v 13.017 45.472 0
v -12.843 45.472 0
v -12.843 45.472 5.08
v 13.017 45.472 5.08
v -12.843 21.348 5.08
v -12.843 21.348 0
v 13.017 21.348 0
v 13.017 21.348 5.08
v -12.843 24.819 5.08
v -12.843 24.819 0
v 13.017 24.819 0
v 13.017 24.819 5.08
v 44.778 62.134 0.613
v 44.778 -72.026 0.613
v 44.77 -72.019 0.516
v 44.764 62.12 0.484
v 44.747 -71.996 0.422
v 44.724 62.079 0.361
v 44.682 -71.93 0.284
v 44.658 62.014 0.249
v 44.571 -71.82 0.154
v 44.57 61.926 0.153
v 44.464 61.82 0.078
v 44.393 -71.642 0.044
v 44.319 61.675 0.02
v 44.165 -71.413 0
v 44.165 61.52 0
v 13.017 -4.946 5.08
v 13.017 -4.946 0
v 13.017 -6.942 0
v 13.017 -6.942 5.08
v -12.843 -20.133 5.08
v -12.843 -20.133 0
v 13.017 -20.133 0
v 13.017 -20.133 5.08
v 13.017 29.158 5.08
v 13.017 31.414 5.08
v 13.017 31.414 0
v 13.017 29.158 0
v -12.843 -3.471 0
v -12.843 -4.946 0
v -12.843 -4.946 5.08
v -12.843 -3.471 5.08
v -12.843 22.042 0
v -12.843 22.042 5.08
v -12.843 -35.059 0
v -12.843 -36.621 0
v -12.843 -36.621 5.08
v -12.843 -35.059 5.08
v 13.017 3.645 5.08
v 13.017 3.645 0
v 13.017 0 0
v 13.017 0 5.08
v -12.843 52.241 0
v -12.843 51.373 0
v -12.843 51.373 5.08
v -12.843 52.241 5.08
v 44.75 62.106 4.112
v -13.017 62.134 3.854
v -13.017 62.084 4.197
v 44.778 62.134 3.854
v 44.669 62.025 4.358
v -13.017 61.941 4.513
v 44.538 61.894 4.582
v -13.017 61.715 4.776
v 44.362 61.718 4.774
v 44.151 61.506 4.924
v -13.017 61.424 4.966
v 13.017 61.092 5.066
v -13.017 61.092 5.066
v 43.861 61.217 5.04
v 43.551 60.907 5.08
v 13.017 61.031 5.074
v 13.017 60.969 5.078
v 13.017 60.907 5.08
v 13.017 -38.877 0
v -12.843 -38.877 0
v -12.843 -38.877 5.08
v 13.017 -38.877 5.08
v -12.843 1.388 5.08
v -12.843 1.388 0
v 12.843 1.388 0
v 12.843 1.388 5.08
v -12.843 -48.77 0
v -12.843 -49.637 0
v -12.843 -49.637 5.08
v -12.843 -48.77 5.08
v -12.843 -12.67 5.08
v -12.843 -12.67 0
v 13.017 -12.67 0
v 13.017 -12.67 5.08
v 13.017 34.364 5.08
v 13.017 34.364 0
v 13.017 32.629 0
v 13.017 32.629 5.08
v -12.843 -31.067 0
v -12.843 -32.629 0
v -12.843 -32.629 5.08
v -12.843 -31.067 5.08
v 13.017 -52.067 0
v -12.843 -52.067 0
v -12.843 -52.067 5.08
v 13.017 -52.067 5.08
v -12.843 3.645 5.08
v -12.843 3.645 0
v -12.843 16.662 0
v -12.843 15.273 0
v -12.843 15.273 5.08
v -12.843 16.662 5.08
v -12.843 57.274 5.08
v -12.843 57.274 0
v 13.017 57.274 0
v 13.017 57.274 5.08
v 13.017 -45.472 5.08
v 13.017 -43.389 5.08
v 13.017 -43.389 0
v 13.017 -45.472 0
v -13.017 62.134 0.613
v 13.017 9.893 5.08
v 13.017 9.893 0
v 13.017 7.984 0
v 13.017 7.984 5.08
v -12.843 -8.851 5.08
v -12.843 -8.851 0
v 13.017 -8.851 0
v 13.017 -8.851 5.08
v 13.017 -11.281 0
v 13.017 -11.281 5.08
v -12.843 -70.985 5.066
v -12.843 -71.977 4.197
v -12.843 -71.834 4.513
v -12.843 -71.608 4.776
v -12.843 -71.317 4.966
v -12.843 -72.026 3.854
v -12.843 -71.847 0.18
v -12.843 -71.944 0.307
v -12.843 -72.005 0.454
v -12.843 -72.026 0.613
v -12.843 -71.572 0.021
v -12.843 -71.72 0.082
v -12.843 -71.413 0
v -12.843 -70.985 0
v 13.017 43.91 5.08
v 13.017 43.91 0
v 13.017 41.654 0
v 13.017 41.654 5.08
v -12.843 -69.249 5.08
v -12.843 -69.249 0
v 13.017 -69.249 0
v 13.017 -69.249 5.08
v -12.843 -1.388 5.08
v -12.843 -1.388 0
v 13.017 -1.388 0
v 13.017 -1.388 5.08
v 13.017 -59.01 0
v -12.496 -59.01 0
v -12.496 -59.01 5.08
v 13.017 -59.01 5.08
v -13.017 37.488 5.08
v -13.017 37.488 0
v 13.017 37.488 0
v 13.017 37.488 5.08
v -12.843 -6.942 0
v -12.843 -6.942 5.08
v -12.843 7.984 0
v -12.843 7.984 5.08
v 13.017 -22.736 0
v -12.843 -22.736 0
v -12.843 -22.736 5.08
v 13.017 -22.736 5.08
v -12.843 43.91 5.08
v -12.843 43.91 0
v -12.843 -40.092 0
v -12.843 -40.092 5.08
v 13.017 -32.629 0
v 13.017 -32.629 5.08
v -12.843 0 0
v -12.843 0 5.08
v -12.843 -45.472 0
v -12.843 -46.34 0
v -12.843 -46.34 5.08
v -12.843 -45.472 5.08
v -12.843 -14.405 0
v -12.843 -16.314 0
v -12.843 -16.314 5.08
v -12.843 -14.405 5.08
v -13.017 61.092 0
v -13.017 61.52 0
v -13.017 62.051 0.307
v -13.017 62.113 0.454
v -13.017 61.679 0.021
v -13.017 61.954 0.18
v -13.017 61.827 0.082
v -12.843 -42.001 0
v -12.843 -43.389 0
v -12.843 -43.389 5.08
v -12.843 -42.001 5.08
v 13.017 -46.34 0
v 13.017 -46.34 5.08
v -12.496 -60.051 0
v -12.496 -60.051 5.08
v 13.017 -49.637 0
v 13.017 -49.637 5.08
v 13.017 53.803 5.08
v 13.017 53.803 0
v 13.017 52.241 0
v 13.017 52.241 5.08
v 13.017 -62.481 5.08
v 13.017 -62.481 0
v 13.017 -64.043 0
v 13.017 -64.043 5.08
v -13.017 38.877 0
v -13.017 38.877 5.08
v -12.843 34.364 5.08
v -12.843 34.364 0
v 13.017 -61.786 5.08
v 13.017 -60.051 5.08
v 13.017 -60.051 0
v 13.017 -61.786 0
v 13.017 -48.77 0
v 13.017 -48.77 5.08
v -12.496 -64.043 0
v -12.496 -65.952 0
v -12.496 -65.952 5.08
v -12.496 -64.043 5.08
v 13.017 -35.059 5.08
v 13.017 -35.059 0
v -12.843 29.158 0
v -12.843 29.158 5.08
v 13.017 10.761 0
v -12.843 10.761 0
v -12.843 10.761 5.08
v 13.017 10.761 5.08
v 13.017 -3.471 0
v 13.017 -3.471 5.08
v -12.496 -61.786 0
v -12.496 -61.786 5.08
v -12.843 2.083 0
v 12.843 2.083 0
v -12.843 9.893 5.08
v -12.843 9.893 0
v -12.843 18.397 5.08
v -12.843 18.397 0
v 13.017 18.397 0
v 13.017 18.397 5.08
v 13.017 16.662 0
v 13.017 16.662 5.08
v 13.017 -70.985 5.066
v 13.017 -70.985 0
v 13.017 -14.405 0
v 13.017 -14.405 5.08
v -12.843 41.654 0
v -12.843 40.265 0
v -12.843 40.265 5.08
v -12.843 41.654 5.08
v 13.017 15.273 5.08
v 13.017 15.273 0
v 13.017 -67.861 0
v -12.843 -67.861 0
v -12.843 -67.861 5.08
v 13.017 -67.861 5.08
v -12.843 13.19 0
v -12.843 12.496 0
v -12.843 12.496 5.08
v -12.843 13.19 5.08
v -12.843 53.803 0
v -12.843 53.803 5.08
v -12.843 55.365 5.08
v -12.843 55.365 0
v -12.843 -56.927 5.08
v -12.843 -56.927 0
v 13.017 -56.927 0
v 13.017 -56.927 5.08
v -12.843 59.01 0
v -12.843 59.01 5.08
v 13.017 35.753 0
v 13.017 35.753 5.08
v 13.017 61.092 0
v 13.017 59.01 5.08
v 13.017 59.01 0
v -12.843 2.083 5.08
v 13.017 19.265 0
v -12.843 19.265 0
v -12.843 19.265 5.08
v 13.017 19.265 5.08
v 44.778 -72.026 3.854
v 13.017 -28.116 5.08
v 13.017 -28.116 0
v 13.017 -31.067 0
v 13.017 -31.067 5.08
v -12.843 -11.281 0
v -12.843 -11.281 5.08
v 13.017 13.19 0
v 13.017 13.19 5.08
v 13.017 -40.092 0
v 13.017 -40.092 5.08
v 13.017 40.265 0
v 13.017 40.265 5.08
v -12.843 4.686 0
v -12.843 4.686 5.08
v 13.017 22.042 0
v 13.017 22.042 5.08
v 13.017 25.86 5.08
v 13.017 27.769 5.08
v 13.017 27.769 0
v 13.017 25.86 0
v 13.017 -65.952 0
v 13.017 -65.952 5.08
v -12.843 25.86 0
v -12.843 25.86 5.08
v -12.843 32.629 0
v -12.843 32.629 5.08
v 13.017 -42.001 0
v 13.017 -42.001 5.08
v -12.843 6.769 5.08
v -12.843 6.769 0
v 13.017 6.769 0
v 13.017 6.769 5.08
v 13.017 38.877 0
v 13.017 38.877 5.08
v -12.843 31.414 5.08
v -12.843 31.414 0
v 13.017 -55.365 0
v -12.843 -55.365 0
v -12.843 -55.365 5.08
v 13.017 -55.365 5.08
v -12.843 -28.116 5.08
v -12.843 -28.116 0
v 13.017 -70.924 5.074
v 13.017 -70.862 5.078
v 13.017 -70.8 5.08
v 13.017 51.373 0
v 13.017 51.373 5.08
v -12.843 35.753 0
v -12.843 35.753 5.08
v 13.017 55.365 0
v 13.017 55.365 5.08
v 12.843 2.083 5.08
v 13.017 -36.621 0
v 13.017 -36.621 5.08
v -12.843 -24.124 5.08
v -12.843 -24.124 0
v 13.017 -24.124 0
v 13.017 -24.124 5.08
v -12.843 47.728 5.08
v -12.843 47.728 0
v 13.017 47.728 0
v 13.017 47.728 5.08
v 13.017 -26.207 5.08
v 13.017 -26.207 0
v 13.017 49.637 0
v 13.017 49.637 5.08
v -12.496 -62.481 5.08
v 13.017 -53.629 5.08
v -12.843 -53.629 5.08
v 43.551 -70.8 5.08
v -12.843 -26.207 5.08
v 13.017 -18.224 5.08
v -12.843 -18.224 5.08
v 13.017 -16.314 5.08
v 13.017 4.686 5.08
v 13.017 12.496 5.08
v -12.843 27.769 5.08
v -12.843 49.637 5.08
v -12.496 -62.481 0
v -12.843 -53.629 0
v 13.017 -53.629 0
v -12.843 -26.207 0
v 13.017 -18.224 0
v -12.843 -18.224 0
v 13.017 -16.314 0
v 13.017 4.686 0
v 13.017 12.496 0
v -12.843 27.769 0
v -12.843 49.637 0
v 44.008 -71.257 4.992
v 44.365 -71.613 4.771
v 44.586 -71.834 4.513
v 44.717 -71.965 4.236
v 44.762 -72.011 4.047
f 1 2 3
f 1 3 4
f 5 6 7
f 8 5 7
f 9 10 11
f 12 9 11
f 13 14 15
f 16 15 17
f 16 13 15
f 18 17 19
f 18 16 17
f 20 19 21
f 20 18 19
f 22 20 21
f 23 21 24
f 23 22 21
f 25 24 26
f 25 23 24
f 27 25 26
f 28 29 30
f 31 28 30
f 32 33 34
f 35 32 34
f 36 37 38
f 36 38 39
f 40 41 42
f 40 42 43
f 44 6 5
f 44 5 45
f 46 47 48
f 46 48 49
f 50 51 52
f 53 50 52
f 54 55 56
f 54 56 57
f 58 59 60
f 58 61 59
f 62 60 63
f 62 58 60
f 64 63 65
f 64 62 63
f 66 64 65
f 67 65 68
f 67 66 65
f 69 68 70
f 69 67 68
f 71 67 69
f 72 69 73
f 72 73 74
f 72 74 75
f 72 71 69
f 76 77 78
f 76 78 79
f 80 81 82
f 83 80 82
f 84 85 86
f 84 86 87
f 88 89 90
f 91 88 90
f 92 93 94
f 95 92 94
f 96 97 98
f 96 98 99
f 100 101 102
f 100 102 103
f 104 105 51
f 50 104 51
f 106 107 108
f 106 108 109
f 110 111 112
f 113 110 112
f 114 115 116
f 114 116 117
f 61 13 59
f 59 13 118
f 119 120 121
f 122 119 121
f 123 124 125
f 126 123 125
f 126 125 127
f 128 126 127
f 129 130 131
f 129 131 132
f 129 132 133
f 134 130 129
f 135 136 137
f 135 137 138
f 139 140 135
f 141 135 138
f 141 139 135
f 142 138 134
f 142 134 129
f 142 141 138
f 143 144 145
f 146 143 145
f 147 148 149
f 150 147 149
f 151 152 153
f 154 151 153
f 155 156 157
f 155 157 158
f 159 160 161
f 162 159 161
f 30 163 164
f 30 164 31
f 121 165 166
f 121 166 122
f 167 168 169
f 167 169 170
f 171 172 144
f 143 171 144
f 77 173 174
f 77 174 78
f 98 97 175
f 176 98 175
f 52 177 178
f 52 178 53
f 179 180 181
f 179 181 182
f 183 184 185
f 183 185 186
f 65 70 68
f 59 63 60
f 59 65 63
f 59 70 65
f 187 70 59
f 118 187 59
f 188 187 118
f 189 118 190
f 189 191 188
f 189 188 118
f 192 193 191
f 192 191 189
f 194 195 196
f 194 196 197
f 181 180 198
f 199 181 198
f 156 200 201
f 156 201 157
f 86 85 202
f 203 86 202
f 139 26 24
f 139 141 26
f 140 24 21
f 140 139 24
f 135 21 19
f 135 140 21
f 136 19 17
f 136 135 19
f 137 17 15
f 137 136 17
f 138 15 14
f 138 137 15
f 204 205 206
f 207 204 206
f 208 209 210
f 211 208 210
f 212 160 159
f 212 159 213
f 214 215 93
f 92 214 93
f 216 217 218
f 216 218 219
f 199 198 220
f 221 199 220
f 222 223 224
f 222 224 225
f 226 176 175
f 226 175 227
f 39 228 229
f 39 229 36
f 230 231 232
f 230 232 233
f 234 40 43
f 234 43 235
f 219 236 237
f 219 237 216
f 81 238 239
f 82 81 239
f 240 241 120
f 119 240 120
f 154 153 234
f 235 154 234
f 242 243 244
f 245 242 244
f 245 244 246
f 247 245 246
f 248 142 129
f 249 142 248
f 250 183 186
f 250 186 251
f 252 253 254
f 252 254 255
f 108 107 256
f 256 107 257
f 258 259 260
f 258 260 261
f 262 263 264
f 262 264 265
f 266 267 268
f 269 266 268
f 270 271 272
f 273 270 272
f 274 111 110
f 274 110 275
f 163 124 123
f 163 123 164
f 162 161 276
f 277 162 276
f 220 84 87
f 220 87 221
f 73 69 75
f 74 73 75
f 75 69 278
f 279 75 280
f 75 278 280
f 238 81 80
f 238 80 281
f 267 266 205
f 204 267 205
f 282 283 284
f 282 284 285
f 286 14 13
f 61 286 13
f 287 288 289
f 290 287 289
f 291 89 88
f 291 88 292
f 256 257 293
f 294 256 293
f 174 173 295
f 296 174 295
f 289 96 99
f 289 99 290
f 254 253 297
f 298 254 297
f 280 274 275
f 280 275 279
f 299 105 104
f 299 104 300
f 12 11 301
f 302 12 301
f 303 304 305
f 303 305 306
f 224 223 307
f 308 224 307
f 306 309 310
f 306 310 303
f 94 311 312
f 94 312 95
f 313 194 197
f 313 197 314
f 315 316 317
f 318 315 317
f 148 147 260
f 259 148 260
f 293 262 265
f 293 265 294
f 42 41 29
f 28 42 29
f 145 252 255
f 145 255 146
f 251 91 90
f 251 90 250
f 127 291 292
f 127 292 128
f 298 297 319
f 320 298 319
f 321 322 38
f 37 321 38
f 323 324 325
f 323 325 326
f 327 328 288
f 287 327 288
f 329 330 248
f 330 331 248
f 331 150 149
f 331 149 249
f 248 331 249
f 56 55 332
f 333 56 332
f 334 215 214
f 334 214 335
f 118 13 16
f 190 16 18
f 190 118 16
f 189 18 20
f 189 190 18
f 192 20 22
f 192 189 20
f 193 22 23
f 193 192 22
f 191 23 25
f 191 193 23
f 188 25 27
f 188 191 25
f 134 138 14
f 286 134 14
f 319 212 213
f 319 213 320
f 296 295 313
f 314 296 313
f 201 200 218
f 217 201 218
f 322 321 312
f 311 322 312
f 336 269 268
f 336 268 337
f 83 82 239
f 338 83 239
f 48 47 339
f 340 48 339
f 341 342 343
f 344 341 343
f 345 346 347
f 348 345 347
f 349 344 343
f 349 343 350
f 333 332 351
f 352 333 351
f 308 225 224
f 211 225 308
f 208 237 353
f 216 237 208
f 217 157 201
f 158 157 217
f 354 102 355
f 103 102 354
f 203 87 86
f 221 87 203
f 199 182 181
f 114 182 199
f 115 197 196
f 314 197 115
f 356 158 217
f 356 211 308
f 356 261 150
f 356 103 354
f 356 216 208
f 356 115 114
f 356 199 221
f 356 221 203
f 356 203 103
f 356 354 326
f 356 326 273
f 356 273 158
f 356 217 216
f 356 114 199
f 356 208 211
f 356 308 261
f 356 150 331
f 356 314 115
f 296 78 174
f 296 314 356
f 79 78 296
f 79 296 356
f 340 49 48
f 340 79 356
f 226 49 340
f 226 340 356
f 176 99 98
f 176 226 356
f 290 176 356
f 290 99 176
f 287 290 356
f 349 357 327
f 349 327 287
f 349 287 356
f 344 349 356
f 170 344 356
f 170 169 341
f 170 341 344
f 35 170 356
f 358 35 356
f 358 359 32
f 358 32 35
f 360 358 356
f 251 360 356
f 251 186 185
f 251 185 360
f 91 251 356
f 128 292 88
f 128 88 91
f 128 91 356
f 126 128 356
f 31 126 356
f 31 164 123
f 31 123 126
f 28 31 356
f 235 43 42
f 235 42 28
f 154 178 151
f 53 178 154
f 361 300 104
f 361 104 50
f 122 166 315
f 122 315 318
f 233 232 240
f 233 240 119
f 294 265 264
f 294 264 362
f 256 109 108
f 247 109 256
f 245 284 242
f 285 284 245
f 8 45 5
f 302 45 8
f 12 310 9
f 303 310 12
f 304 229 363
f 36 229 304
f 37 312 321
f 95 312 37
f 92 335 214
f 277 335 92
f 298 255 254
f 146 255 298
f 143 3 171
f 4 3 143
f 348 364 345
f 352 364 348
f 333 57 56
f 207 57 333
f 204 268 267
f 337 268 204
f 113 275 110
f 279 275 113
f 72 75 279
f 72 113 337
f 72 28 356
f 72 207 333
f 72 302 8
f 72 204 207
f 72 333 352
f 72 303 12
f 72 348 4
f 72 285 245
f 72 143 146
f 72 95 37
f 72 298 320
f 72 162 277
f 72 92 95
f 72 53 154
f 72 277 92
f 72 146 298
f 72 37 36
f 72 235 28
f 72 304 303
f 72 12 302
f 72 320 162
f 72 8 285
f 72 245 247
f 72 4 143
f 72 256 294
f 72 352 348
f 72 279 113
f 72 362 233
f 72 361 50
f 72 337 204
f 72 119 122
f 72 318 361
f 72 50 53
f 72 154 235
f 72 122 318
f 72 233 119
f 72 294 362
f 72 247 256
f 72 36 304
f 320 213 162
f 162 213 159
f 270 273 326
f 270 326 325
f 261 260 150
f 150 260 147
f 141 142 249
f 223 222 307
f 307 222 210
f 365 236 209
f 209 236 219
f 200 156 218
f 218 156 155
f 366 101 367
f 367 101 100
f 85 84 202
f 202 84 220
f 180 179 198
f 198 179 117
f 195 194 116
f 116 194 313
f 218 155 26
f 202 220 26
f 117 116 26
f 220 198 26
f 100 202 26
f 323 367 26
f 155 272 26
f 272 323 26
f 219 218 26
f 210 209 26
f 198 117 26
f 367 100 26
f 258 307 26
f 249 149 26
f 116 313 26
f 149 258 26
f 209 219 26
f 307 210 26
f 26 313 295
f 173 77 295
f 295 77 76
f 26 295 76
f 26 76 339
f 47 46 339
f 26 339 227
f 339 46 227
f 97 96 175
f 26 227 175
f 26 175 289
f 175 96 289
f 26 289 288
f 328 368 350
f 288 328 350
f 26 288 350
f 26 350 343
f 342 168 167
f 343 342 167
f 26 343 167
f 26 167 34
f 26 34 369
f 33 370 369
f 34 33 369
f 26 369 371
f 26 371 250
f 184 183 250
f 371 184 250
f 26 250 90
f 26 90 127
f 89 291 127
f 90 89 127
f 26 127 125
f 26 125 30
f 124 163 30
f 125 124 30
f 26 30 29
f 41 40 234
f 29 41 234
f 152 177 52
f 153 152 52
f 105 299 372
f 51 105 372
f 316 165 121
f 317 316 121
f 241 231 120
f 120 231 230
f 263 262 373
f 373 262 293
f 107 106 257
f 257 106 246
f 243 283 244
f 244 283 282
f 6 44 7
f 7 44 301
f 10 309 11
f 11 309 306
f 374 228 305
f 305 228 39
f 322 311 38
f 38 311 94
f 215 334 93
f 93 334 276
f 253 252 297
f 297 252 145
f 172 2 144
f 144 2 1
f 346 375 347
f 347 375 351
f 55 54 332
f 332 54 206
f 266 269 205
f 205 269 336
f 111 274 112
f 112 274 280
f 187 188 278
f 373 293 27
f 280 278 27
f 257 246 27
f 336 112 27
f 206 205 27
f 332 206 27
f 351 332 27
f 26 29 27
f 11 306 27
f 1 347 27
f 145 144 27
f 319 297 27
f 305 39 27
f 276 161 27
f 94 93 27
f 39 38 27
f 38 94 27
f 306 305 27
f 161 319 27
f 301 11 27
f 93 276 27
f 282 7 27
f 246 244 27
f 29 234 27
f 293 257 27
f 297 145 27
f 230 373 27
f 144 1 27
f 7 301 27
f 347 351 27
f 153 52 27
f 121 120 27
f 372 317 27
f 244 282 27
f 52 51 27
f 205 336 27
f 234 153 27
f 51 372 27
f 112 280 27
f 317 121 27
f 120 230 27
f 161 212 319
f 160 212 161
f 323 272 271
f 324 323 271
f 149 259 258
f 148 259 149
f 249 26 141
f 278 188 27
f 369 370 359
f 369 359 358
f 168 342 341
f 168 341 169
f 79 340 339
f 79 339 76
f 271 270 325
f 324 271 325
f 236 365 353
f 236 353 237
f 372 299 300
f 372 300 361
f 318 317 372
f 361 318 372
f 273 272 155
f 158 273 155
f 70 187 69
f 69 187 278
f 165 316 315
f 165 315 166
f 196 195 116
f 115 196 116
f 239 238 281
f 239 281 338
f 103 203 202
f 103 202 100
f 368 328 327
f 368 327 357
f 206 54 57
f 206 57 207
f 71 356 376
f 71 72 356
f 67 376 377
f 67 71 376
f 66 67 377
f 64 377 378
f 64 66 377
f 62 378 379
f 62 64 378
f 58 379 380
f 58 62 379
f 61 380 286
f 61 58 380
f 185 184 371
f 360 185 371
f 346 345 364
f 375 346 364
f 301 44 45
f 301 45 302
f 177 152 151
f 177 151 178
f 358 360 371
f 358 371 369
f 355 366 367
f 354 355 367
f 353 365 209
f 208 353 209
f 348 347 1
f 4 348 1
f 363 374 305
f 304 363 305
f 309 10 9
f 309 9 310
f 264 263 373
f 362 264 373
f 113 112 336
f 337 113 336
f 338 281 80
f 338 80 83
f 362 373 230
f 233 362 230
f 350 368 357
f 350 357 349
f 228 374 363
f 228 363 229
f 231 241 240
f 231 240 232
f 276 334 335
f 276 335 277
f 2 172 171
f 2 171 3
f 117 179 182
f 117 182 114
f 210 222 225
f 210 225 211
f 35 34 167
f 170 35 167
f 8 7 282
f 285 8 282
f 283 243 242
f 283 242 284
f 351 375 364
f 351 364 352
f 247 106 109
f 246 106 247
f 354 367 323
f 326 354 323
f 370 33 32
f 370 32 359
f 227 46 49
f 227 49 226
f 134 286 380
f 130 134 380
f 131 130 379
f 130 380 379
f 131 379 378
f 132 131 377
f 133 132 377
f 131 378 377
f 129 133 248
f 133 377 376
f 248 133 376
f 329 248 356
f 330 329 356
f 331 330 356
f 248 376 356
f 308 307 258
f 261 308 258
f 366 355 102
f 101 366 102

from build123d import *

# Parameters (mm, degrees)
F1_DEPTH = 5.08
F0_W     = 26.033623144
F0_H     = 1.041341573
F0_W_2   = 25.8600655943
F0_H_2   = 1.7355754972
F0_H_3   = 1.0413378477
F0_H_4   = 1.5620179474
F0_H_5   = 1.3884603977
F0_H_6   = 0.8677877486
F0_W_3   = 25.5129504949
F0_H_7   = 1.9091293216
F0_H_8   = 1.9091330469
F0_H_9   = 0.6942301989
F0_H_10  = 1.5620142221
F0_H_11  = 1.3884566724
F0_H_12  = 0.8677914739
F0_H_13  = 1.214902848
F0_H_14  = 1.3884585351
F0_H_15  = 1.0413434356
F0_H_16  = 1.2149065733
F0_H_17  = 0.8677858859
F0_H_18  = 1.5620198101
F0_W_4   = 1.7355754972
F0_H_19  = 1.9091311842
F0_H_20  = 0.6942292675
F0_H_21  = 1.2149023823
F0_H_22  = 1.0413455311
F0_H_23  = 1.3884599321
F0_H_24  = 1.9091316499
F0_H_25  = 1.4752384741
F2_DEPTH = 5.08
F0_W_5   = 25.6865080446
F0_H_26  = 0.6942305481
F3_R     = 1.2264204897
F4_R     = 0.6132102448


with BuildPart() as f1:
    # F0 (on Top) → F1 (new body)
    with BuildSketch(Plane.XY):
        Polygon((44.7778329253, 62.133576721), (13.016811572, 62.133576721), (13.016811572, 61.092235148), (13.016811572, 59.0095482767), (13.016811572, 57.2739727795), (13.016811572, 55.3648397326), (13.016811572, 53.8028217852), (13.016811572, 52.2408038378), (13.016811572, 51.3730160892), (13.016811572, 49.6374443173), (13.016811572, 47.7283112705), (13.016811572, 45.4720593989), (13.016811572, 43.9100451767), (13.016811572, 41.6537933052), (13.016811572, 40.2653366327), (13.016811572, 38.876876235), (13.016811572, 37.4884158373), (13.016811572, 35.7528403401), (13.016811572, 34.3643836677), (13.016811572, 32.6288081706), (13.016811572, 31.4139053226), (13.016811572, 29.1576571763), (13.016811572, 27.7691986412), (13.016811572, 25.8600655943), (13.016811572, 24.8187221587), (13.016811572, 22.0418013632), (13.016811572, 21.3475711644), (13.016811572, 19.2648805678), (13.016811572, 18.3970946819), (13.016811572, 16.6615191847), (14.7523870692, 16.6615191847), (14.7523870692, 15.273058787), (13.016811572, 15.273058787), (13.016811572, 13.1903681904), (13.016811572, 12.4961389229), (13.016811572, 10.760564357), (13.016811572, 9.8927766085), (13.016811572, 7.9836444929), (13.016811572, 6.7687421106), (13.016811572, 4.6860519797), (13.016811572, 3.6447064485), (13.016811572, 0), (13.016811572, -1.3884599321), (13.016811572, -3.4711498301), (13.016811572, -4.9463883042), (13.016811572, -6.9422996603), (13.016811572, -8.8514313102), (13.016811572, -11.2812360749), (13.016811572, -12.6696964726), (13.016811572, -14.4052710384), (13.016811572, -16.3144040853), (13.016811572, -18.2235352695), (13.016811572, -20.1326683164), (13.016811572, -22.7360296994), (13.016811572, -24.1244900972), (13.016811572, -26.2071806937), (13.016811572, -28.116311878), (13.016811572, -31.0667883605), (13.016811572, -32.6288081706), (13.016811572, -35.0586138666), (13.016811572, -36.6206280887), (13.016811572, -38.876876235), (13.016811572, -40.0917828083), (13.016811572, -42.0009121299), (13.016811572, -43.3893688023), (13.016811572, -45.4720593989), (13.016811572, -46.3398508728), (13.016811572, -48.7696528435), (13.016811572, -49.6374443173), (13.016811572, -52.0672462881), (13.016811572, -53.6292642355), (13.016811572, -55.3648397326), (13.016811572, -56.9268576801), (13.016811572, -59.0095482767), (13.016811572, -60.0508898497), (13.016811572, -61.7864653468), (13.016811572, -62.4806955457), (13.016811572, -64.0427097678), (13.016811572, -65.9518390894), (13.016811572, -67.8609758615), (13.016811572, -69.2494362593), (13.016811572, -70.9850154817), (13.016811572, -72.0263533294), (44.7778329253, -72.0263533294), align=None)
    extrude(amount=F1_DEPTH)

    # F0 (on Top) → F2 (join)
    with BuildSketch(Plane.XY):
        Polygon((44.7778329253, 62.133576721), (13.016811572, 62.133576721), (13.016811572, 61.092235148), (13.016811572, 59.0095482767), (13.016811572, 57.2739727795), (13.016811572, 55.3648397326), (13.016811572, 53.8028217852), (13.016811572, 52.2408038378), (13.016811572, 51.3730160892), (13.016811572, 49.6374443173), (13.016811572, 47.7283112705), (13.016811572, 45.4720593989), (13.016811572, 43.9100451767), (13.016811572, 41.6537933052), (13.016811572, 40.2653366327), (13.016811572, 38.876876235), (13.016811572, 37.4884158373), (13.016811572, 35.7528403401), (13.016811572, 34.3643836677), (13.016811572, 32.6288081706), (13.016811572, 31.4139053226), (13.016811572, 29.1576571763), (13.016811572, 27.7691986412), (13.016811572, 25.8600655943), (13.016811572, 24.8187221587), (13.016811572, 22.0418013632), (13.016811572, 21.3475711644), (13.016811572, 19.2648805678), (13.016811572, 18.3970946819), (13.016811572, 16.6615191847), (14.7523870692, 16.6615191847), (14.7523870692, 15.273058787), (13.016811572, 15.273058787), (13.016811572, 13.1903681904), (13.016811572, 12.4961389229), (13.016811572, 10.760564357), (13.016811572, 9.8927766085), (13.016811572, 7.9836444929), (13.016811572, 6.7687421106), (13.016811572, 4.6860519797), (13.016811572, 3.6447064485), (13.016811572, 0), (13.016811572, -1.3884599321), (13.016811572, -3.4711498301), (13.016811572, -4.9463883042), (13.016811572, -6.9422996603), (13.016811572, -8.8514313102), (13.016811572, -11.2812360749), (13.016811572, -12.6696964726), (13.016811572, -14.4052710384), (13.016811572, -16.3144040853), (13.016811572, -18.2235352695), (13.016811572, -20.1326683164), (13.016811572, -22.7360296994), (13.016811572, -24.1244900972), (13.016811572, -26.2071806937), (13.016811572, -28.116311878), (13.016811572, -31.0667883605), (13.016811572, -32.6288081706), (13.016811572, -35.0586138666), (13.016811572, -36.6206280887), (13.016811572, -38.876876235), (13.016811572, -40.0917828083), (13.016811572, -42.0009121299), (13.016811572, -43.3893688023), (13.016811572, -45.4720593989), (13.016811572, -46.3398508728), (13.016811572, -48.7696528435), (13.016811572, -49.6374443173), (13.016811572, -52.0672462881), (13.016811572, -53.6292642355), (13.016811572, -55.3648397326), (13.016811572, -56.9268576801), (13.016811572, -59.0095482767), (13.016811572, -60.0508898497), (13.016811572, -61.7864653468), (13.016811572, -62.4806955457), (13.016811572, -64.0427097678), (13.016811572, -65.9518390894), (13.016811572, -67.8609758615), (13.016811572, -69.2494362593), (13.016811572, -70.9850154817), (13.016811572, -72.0263533294), (44.7778329253, -72.0263533294), align=None)
        with Locations((0, 61.6129059345)):
            Rectangle(F0_W, F0_H)
        with Locations((0.0867787749, 58.1417605281)):
            Rectangle(F0_W_2, F0_H_2)
        with Locations((0.0867787749, -71.5056844056)):
            Rectangle(F0_W_2, F0_H_3)
        with Locations((0.0867787749, 54.5838307589)):
            Rectangle(F0_W_2, F0_H_4)
        with Locations((0.0867787749, -68.5552060604)):
            Rectangle(F0_W_2, F0_H_5)
        with Locations((0.0867787749, 51.8069099635)):
            Rectangle(F0_W_2, F0_H_6)
        with Locations((0.2603363246, -64.9972744286)):
            Rectangle(F0_W_3, F0_H_7)
        with Locations((0.0867787749, 48.6828777939)):
            Rectangle(F0_W_2, F0_H_8)
        with Locations((0.2603363246, -62.1335804462)):
            Rectangle(F0_W_3, F0_H_9)
        with Locations((0.0867787749, 44.6910522878)):
            Rectangle(F0_W_2, F0_H_10)
        with Locations((0.2603363246, -59.5302190632)):
            Rectangle(F0_W_3, F0_H)
        with Locations((0.0867787749, 40.9595649689)):
            Rectangle(F0_W_2, F0_H_11)
        with Locations((0.0867787749, -56.1458487064)):
            Rectangle(F0_W_2, F0_H_4)
        with Locations((0, 38.1826460361)):
            Rectangle(F0_W, F0_H_5)
        with Locations((0.0867787749, -52.8482552618)):
            Rectangle(F0_W_2, F0_H_4)
        with Locations((0.0867787749, 35.0586120039)):
            Rectangle(F0_W_2, F0_H_11)
        with Locations((0.0867787749, -49.2035485804)):
            Rectangle(F0_W_2, F0_H_12)
        with Locations((0.0867787749, 32.0213567466)):
            Rectangle(F0_W_2, F0_H_13)
        with Locations((0.0867787749, -45.9059551358)):
            Rectangle(F0_W_2, F0_H_12)
        with Locations((0.0867787749, 28.4634279087)):
            Rectangle(F0_W_2, F0_H_14)
        with Locations((0.0867787749, -42.6951404661)):
            Rectangle(F0_W_2, F0_H_11)
        with Locations((0.0867787749, 25.3393938765)):
            Rectangle(F0_W_2, F0_H_15)
        with Locations((0.0867787749, -39.4843295217)):
            Rectangle(F0_W_2, F0_H_16)
        with Locations((0.0867787749, 21.6946862638)):
            Rectangle(F0_W_2, F0_H_9)
        with Locations((0.0867787749, -35.8396209776)):
            Rectangle(F0_W_2, F0_H_10)
        with Locations((0.0867787749, 18.8309876248)):
            Rectangle(F0_W_2, F0_H_17)
        with Locations((0.0867787749, -31.8477982655)):
            Rectangle(F0_W_2, F0_H_18)
        with Locations((13.8845993206, 15.9672889858)):
            Rectangle(F0_W_4, F0_H_5)
        with Locations((0.0867787749, 15.9672889858)):
            Rectangle(F0_W_2, F0_H_5)
        with Locations((0.0867787749, -27.1617462859)):
            Rectangle(F0_W_2, F0_H_19)
        with Locations((0.0867787749, 12.8432535566)):
            Rectangle(F0_W_2, F0_H_20)
        with Locations((0.0867787749, -23.4302598983)):
            Rectangle(F0_W_2, F0_H_5)
        with Locations((0.0867787749, 10.3266704828)):
            Rectangle(F0_W_2, F0_H_6)
        with Locations((0.0867787749, -19.1781017929)):
            Rectangle(F0_W_2, F0_H_8)
        with Locations((0.0867787749, 7.3761933018)):
            Rectangle(F0_W_2, F0_H_21)
        with Locations((0.0867787749, -15.3598375618)):
            Rectangle(F0_W_2, F0_H_8)
        with Locations((0.0867787749, 4.1653792141)):
            Rectangle(F0_W_2, F0_H_22)
        with Locations((0.0867787749, -11.9754662737)):
            Rectangle(F0_W_2, F0_H_5)
        with Locations((0.0867787749, -0.694229966)):
            Rectangle(F0_W_2, F0_H_23)
        with Locations((0.0867787749, -7.8968654852)):
            Rectangle(F0_W_2, F0_H_24)
        with Locations((0.0867787749, -4.2087690672)):
            Rectangle(F0_W_2, F0_H_25)
    extrude(amount=F2_DEPTH)

    # F3
    f3_edges = [f1.edges().sort_by_distance(p)[0] for p in [
        (15.880511, 62.133577, 5.08),
        (44.777833, -4.946388, 5.08),
        (15.967289, -72.026353, 5.08),
    ]]
    fillet(f3_edges, radius=F3_R)

    # F4
    f4_edges = [f1.edges().sort_by_distance(p)[0] for p in [
        (15.967289, -72.026353, 0),
        (44.777833, -4.946388, 0),
        (15.880511, 62.133577, 0),
    ]]
    fillet(f4_edges, radius=F4_R)


with BuildPart() as f2:
    # F0 (on Top) → F2, piece 2 (new body)
    with BuildSketch(Plane.XY):
        with Locations((0, 1.735574624)):
            Rectangle(F0_W_5, F0_H_26)
    extrude(amount=F2_DEPTH)


solid = Compound([f1.part, f2.part])
